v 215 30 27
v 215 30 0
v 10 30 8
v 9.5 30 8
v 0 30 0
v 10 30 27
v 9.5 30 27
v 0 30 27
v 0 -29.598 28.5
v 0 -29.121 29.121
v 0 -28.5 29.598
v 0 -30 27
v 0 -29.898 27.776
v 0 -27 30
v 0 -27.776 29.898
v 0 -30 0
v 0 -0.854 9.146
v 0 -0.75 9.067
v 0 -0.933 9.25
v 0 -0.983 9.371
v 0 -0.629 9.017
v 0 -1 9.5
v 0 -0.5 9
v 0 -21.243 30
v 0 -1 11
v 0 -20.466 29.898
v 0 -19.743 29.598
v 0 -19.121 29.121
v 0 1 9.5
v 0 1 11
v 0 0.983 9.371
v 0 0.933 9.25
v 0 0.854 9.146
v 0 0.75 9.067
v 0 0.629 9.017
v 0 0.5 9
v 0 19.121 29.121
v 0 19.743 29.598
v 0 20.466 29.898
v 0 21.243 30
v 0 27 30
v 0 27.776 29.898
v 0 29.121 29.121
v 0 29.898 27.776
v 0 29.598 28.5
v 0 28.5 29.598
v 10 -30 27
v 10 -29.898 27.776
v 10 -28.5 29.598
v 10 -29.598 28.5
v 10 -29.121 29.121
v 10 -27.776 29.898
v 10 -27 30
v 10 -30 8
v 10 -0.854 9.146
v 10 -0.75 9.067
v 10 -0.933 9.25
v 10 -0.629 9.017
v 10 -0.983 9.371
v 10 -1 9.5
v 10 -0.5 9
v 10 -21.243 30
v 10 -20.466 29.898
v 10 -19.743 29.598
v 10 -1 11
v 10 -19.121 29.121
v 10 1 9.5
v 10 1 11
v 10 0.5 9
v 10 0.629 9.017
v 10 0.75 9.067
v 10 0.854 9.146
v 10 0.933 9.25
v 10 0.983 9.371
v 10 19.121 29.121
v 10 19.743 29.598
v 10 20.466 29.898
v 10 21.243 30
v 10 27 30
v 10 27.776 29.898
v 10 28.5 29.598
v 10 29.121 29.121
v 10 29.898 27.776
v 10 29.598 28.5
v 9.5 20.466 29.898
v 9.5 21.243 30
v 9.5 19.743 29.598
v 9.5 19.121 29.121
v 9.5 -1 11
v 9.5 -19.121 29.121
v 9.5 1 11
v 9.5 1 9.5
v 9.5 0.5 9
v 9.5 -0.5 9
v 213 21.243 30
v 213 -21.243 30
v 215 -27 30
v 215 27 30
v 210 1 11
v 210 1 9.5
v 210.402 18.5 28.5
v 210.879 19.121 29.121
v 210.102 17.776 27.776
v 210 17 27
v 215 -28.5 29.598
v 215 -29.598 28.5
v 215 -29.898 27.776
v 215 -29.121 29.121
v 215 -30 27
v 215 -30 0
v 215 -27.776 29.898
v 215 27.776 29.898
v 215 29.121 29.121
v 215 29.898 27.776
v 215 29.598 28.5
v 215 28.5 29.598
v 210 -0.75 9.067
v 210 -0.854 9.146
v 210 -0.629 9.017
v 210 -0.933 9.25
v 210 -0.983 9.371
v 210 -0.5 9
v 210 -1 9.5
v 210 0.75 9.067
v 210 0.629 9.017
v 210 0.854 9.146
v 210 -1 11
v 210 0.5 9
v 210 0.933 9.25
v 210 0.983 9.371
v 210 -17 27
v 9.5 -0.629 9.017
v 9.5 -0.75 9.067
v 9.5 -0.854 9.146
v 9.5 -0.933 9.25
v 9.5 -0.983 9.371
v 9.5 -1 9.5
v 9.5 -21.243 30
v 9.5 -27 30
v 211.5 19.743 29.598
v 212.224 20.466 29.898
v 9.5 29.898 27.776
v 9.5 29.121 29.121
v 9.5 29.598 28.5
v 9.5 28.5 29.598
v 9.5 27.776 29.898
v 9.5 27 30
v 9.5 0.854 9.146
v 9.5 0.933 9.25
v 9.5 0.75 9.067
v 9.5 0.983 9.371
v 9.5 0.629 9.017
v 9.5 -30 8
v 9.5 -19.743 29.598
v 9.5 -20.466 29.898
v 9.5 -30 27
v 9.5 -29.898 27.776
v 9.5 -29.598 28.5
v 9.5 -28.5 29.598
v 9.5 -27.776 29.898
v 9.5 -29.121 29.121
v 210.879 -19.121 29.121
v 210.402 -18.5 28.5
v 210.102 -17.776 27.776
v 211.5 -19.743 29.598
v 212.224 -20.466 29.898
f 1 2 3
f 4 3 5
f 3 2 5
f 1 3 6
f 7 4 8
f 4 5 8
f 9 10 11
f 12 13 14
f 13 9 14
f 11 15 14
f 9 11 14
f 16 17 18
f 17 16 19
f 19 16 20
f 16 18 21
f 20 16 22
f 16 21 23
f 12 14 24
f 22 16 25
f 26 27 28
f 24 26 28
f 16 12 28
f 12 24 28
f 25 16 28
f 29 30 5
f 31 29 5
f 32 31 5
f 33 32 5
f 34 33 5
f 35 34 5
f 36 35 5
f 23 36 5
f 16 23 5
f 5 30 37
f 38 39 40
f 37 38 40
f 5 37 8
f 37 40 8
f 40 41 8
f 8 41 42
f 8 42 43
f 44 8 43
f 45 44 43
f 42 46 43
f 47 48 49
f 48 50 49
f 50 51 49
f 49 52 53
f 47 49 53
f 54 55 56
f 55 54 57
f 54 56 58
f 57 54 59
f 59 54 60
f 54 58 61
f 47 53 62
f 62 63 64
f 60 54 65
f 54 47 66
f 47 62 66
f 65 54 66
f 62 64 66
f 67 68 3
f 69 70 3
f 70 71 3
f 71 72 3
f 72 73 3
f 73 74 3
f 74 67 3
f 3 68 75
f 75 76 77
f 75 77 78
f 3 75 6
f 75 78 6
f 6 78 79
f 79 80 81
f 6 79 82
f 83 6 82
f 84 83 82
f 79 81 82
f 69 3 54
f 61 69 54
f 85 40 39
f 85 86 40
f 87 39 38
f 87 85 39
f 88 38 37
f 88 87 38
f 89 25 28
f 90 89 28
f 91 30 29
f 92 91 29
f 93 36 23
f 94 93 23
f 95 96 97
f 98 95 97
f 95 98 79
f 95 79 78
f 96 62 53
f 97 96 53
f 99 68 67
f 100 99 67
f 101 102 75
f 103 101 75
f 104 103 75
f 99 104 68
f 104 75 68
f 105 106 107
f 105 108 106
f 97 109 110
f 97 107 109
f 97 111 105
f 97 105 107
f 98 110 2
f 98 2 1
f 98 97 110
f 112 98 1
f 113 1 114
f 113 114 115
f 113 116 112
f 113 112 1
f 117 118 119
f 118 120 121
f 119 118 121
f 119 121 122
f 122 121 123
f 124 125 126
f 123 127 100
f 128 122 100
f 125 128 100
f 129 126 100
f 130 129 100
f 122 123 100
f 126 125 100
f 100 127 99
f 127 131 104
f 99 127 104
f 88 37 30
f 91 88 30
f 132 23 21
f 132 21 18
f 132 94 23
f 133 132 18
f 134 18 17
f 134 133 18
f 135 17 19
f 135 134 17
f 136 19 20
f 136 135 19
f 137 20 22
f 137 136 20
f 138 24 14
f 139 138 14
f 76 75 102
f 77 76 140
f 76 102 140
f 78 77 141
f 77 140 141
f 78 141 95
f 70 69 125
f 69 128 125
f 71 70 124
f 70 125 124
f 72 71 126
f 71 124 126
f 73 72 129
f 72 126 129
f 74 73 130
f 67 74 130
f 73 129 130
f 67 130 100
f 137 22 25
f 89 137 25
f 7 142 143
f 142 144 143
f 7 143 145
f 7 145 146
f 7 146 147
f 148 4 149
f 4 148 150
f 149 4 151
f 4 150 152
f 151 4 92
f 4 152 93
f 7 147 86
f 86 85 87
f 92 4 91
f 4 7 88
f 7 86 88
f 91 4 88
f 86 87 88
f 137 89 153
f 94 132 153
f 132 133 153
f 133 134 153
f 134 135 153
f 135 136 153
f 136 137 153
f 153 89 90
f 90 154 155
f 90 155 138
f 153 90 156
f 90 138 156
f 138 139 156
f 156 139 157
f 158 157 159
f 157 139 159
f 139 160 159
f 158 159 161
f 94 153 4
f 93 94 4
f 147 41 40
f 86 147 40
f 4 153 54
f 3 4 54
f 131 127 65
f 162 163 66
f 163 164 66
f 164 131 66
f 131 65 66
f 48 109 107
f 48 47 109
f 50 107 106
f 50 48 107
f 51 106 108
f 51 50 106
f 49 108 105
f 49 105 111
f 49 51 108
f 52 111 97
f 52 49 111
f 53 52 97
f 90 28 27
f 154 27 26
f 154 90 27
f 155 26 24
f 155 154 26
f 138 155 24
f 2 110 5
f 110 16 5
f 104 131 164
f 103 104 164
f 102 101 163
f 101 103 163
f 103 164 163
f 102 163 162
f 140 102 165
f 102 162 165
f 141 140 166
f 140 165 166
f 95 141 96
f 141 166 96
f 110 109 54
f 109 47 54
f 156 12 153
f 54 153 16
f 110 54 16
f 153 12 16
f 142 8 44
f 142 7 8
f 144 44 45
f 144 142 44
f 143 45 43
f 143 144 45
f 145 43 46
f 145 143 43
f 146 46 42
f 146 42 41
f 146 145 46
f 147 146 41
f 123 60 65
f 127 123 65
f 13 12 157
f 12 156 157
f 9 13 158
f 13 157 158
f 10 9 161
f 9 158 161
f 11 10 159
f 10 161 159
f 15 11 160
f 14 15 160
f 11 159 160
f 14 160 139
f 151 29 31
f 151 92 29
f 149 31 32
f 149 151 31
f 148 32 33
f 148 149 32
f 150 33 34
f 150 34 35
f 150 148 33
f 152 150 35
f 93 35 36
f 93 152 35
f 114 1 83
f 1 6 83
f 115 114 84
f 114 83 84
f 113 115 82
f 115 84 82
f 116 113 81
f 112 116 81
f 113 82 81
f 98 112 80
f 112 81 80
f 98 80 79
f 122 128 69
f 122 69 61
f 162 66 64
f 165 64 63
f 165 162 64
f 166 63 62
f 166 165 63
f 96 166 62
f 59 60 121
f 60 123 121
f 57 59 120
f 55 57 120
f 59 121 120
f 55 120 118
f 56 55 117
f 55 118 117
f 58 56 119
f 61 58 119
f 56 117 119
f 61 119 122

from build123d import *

# Parameters (mm, degrees)
F1_DEPTH = 210
F2_W     = 0.5
F2_H     = 10
F2_H_2   = 68.033398215
F3_DEPTH = 22
F4_R     = 0.5
F6_DEPTH = 5
F7_R     = 3


with BuildPart() as f1:
    # F0 (on Right) → F1 (new body)
    with BuildSketch(Plane.YZ):
        Polygon((30, 0), (30, 30), (20, 30), (1, 11), (1, 9), (-1, 9), (-1, 11), (-20, 30), (-30, 30), (-30, 0), align=None)
    extrude(amount=F1_DEPTH)

    # F2 (on face) → F3 (cut)
    with BuildSketch(Plane.XY.offset(30)):
        with Locations((9.75, 25)):
            Rectangle(F2_W, F2_H)
        with Locations((9.75, -14.0166991075)):
            Rectangle(F2_W, F2_H_2)
    extrude(amount=-F3_DEPTH, mode=Mode.SUBTRACT)

    # F4
    f4_edges = [f1.edges().sort_by_distance(p)[0] for p in [
        (110, -1, 9),
        (110, 1, 9),
        (4.75, -1, 9),
        (4.75, 1, 9),
    ]]
    fillet(f4_edges, radius=F4_R)

    # F5 (on face) → F6 (join)
    with BuildSketch(Plane.YZ.offset(210)):
        with BuildLine():
            Line((20, 30), (-20, 30))
            Line((-20, 30), (-1, 11))
            Line((-1, 11), (-1, 9.5))
            ThreePointArc((-1, 9.5), (-0.8535533906, 9.1464466094), (-0.5, 9))
            Line((-0.5, 9), (0.5, 9))
            ThreePointArc((0.5, 9), (0.8535533906, 9.1464466094), (1, 9.5))
            Line((1, 9.5), (1, 11))
            Line((1, 11), (20, 30))
        make_face()
        with BuildLine():
            Line((-30, 30), (-30, 0))
            Line((-30, 0), (30, 0))
            Line((30, 0), (30, 30))
            Line((30, 30), (20, 30))
            Line((20, 30), (1, 11))
            Line((1, 11), (1, 9.5))
            ThreePointArc((1, 9.5), (0.8535533906, 9.1464466094), (0.5, 9))
            Line((0.5, 9), (-0.5, 9))
            ThreePointArc((-0.5, 9), (-0.8535533906, 9.1464466094), (-1, 9.5))
            Line((-1, 9.5), (-1, 11))
            Line((-1, 11), (-20, 30))
            Line((-20, 30), (-30, 30))
        make_face()
    extrude(amount=F6_DEPTH)

    # F7
    f7_edges = [f1.edges().sort_by_distance(p)[0] for p in [
        (112.5, 30, 30),
        (4.75, 30, 30),
        (112.5, -30, 30),
        (4.75, -30, 30),
        (110, -20, 30),
        (4.75, -20, 30),
        (4.75, 20, 30),
        (110, 20, 30),
        (210, 0, 30),
    ]]
    fillet(f7_edges, radius=F7_R)


solid = f1.part
